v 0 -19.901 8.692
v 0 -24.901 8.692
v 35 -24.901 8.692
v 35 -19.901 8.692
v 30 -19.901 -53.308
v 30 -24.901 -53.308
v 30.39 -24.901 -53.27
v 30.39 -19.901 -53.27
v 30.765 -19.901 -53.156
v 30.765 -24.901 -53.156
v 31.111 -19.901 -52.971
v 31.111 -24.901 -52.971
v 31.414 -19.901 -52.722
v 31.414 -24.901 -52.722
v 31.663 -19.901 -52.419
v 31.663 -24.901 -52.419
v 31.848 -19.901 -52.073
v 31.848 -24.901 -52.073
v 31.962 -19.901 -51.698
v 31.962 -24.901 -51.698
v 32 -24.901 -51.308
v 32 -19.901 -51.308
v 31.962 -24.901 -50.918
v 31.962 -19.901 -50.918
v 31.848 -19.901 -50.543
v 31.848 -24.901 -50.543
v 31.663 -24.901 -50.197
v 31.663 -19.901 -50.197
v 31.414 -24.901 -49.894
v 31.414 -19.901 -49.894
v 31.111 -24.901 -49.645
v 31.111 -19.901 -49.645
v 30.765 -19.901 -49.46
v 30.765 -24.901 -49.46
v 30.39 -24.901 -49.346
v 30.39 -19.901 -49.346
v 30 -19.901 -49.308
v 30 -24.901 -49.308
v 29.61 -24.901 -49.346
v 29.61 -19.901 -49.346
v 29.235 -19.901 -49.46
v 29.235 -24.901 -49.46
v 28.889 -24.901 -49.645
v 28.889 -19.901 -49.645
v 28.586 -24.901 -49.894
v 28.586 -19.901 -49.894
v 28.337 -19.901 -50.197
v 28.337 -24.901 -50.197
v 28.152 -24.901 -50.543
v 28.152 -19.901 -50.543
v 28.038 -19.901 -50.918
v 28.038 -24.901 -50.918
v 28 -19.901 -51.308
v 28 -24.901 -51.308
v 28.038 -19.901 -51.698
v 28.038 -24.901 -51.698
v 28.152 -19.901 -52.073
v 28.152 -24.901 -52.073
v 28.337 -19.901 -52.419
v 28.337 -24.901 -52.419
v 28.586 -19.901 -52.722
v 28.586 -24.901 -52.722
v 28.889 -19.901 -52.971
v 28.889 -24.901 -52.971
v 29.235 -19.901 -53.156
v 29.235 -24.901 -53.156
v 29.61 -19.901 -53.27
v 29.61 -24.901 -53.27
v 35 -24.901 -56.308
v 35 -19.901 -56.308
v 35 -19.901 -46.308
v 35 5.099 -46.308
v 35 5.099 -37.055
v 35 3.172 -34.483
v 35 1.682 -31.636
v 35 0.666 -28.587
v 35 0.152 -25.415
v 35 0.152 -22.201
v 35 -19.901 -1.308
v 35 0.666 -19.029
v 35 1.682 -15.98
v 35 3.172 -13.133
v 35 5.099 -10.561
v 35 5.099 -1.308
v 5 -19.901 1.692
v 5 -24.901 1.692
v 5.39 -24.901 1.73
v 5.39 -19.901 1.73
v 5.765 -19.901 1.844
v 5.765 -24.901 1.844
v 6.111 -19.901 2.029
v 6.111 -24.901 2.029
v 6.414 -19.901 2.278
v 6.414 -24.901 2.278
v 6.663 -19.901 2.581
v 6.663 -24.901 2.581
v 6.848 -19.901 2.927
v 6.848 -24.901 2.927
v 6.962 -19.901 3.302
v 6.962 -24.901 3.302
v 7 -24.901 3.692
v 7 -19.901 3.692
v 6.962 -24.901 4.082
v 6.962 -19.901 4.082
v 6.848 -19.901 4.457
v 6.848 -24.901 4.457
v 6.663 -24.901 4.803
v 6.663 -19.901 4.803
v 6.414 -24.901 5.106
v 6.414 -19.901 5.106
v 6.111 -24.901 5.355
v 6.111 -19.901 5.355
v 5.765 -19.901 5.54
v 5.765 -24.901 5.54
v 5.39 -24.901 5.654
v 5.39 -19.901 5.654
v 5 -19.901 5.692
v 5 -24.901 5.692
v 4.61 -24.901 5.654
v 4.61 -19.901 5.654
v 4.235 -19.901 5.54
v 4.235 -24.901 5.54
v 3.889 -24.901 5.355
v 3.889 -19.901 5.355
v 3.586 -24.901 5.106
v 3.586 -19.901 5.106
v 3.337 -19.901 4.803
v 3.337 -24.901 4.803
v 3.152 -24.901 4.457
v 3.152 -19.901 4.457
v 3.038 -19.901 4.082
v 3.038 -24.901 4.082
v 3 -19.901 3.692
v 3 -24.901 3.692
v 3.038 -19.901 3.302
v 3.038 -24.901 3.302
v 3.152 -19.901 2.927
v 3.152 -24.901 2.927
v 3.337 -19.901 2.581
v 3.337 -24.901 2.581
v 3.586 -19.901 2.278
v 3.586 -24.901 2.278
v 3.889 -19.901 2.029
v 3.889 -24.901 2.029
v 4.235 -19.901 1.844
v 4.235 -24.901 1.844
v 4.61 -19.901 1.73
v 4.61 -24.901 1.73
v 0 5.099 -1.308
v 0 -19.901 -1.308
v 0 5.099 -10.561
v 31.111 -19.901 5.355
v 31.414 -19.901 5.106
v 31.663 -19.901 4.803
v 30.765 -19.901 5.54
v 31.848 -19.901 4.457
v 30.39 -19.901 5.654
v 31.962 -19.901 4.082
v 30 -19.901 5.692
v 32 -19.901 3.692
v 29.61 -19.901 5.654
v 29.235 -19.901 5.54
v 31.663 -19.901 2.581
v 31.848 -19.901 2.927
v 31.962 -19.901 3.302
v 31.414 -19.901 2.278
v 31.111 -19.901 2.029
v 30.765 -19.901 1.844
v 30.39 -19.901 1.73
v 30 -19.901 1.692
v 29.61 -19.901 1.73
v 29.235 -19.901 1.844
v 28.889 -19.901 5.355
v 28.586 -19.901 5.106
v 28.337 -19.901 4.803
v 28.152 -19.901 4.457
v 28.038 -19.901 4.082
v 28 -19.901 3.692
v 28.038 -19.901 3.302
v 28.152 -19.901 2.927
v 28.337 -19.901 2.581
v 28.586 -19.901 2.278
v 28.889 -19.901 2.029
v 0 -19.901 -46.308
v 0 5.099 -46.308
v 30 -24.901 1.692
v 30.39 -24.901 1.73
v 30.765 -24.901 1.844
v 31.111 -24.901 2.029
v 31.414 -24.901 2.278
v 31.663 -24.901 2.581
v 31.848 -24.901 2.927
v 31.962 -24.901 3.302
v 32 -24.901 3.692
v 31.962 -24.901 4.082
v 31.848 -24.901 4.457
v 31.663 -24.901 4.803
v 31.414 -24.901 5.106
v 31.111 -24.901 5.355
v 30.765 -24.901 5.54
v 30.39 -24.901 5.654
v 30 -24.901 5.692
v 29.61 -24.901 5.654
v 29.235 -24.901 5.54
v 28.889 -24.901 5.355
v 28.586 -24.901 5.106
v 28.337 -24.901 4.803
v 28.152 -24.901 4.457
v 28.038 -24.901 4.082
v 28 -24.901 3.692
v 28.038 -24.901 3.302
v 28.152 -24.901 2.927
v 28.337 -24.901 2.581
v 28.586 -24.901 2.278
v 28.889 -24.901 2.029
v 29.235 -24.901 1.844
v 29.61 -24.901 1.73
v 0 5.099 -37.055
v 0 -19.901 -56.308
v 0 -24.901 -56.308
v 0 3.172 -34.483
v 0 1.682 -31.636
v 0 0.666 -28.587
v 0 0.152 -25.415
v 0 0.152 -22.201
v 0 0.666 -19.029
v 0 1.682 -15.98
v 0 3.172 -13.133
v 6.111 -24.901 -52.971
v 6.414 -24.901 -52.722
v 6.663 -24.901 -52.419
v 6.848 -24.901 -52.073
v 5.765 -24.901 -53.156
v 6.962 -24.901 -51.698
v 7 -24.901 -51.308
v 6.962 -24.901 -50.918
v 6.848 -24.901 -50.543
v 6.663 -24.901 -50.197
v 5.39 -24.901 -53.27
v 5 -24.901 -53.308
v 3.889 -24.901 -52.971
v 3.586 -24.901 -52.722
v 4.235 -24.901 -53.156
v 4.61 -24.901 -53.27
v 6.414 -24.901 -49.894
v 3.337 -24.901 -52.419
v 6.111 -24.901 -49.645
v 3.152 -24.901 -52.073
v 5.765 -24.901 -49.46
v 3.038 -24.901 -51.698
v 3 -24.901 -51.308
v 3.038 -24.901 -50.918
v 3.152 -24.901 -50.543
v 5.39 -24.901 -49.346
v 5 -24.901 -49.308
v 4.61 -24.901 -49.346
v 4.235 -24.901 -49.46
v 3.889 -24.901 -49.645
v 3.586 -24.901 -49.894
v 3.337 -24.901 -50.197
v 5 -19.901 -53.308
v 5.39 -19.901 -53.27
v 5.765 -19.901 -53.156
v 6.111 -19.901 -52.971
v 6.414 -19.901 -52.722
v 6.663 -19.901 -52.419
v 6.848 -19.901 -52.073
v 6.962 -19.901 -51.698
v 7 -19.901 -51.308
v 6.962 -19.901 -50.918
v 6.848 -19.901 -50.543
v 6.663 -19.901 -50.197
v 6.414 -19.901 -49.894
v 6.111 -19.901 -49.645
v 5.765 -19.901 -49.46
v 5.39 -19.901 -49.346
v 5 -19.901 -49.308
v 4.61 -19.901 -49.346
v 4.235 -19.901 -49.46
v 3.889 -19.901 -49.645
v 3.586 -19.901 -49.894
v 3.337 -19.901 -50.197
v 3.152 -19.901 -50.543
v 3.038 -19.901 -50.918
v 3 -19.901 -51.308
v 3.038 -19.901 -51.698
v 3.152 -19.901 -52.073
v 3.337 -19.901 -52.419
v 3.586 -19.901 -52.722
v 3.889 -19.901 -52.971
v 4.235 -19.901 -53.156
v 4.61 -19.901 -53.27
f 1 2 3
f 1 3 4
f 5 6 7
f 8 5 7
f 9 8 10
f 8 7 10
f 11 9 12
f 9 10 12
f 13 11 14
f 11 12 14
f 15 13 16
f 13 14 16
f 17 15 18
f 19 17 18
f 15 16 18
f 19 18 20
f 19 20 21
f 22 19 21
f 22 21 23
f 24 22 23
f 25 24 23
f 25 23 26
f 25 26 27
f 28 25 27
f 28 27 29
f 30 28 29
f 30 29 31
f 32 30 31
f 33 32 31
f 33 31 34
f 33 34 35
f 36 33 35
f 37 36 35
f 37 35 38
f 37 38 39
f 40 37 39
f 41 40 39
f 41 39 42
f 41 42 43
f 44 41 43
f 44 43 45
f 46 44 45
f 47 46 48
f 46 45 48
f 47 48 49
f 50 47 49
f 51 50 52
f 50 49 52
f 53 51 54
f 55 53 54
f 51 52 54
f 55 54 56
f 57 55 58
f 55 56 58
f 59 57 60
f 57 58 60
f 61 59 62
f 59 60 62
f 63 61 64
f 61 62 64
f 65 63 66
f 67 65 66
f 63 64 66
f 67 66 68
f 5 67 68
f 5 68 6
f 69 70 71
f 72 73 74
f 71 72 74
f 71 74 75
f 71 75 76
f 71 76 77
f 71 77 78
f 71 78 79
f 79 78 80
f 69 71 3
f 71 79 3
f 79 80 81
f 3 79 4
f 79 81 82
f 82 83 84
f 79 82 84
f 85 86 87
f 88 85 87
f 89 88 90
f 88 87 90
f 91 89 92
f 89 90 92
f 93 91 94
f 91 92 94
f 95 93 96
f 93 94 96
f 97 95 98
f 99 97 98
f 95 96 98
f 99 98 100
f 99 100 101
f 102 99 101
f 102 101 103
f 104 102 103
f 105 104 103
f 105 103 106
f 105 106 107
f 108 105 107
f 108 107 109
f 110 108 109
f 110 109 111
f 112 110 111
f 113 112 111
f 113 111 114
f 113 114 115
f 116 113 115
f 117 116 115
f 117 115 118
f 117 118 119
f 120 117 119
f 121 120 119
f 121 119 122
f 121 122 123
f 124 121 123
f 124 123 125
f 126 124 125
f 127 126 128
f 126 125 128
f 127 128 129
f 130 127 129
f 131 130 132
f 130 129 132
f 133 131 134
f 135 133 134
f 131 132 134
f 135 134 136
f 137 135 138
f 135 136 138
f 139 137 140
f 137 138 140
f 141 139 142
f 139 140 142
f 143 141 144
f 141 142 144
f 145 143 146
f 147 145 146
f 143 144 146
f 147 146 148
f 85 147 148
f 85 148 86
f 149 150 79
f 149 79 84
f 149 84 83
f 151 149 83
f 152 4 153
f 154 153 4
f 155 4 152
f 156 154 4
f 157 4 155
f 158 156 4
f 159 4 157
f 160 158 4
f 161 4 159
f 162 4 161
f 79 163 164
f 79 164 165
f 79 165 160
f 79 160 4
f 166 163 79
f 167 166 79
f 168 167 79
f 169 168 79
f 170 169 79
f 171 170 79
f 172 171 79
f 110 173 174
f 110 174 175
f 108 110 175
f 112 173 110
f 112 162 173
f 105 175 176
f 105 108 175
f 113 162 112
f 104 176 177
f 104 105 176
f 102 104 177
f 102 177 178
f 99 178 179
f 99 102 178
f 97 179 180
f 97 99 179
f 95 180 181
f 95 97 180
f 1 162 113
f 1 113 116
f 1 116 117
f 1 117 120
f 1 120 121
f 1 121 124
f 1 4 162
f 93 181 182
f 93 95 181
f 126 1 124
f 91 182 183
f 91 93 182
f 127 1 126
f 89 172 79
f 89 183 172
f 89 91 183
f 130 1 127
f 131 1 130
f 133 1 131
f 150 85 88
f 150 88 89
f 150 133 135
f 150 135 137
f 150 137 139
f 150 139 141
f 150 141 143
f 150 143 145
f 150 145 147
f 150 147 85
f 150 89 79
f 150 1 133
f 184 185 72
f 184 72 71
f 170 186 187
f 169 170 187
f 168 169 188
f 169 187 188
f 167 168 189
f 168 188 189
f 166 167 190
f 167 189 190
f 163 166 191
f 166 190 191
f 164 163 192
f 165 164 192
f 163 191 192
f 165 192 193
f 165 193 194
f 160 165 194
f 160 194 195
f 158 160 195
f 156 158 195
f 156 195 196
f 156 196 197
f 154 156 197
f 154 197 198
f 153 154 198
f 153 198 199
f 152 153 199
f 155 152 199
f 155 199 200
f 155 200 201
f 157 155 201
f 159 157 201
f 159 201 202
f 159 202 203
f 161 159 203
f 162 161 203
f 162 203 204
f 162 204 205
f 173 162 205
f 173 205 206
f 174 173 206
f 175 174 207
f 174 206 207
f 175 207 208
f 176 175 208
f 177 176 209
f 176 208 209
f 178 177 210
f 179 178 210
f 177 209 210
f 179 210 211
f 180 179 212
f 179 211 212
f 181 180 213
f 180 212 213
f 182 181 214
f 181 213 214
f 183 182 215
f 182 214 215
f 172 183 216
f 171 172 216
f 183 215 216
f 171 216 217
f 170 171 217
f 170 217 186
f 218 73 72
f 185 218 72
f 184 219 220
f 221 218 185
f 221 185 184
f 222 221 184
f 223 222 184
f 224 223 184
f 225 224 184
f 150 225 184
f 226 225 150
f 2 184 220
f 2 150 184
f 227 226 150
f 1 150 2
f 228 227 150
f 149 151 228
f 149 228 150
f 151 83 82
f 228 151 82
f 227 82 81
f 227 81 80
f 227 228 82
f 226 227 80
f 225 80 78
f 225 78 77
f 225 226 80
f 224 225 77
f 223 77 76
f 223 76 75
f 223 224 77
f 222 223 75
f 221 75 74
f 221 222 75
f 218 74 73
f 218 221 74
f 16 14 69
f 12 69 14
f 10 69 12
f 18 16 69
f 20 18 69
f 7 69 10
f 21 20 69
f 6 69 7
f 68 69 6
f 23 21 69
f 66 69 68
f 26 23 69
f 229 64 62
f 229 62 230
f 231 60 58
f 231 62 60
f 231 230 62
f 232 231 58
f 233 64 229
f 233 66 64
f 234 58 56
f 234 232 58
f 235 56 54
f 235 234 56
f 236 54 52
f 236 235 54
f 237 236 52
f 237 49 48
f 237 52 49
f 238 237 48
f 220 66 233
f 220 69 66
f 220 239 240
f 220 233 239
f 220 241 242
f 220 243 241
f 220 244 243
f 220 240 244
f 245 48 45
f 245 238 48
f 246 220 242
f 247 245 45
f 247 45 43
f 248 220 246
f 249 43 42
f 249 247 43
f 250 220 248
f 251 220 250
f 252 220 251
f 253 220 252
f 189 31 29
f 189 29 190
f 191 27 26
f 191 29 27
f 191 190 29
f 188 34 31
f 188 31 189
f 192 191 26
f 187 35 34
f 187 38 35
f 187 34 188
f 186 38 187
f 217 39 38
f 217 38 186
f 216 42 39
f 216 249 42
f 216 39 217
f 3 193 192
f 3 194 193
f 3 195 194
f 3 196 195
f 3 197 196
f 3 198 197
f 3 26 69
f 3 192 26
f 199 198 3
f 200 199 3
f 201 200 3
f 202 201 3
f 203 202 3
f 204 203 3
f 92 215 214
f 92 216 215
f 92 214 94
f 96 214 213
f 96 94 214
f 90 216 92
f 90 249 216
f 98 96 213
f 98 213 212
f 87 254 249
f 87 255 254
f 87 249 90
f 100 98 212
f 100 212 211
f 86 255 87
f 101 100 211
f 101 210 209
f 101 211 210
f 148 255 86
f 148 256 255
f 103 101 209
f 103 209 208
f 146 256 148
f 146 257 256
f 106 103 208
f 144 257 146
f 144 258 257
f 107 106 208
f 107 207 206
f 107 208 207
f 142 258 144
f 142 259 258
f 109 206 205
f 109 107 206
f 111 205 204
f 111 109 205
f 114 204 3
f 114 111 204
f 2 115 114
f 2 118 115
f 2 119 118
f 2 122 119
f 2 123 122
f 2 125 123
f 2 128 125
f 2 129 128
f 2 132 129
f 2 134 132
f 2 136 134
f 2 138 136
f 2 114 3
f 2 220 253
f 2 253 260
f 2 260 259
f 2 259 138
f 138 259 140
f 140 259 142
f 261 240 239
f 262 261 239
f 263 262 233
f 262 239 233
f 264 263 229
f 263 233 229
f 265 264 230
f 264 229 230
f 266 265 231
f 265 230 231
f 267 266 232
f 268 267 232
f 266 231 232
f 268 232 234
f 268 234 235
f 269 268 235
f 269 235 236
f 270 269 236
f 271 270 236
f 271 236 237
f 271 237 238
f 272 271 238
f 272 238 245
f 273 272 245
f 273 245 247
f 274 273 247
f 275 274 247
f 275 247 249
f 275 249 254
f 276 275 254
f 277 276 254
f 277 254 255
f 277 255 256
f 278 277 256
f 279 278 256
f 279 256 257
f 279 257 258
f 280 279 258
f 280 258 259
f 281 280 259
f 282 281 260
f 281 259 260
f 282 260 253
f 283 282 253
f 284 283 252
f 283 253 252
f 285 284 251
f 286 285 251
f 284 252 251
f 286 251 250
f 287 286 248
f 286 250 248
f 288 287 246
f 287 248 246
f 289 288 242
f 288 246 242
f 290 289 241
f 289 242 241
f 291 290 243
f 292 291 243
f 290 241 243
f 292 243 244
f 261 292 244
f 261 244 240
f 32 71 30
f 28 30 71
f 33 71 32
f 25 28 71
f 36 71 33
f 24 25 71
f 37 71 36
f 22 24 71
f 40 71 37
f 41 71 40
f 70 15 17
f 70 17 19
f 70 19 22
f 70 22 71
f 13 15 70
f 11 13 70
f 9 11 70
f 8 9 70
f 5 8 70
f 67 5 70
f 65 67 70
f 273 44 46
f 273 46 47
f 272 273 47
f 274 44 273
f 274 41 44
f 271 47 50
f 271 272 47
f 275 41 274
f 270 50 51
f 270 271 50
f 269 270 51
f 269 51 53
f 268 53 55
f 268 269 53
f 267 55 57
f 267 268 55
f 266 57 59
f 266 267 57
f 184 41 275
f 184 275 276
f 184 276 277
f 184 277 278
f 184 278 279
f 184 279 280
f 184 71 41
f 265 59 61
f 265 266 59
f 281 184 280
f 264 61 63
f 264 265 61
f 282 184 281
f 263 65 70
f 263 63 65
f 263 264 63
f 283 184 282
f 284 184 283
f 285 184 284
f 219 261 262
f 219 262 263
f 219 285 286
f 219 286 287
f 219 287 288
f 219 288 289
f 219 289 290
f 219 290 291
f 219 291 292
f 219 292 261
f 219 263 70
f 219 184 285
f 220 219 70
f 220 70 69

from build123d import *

# Parameters (mm, degrees)
EXTRUDE_1_DEPTH     = 35
SKETCH_5_R          = 2
CUT_EXTRUDE_2_DEPTH = 10


with BuildPart() as part:
    # 草图3 → 凸台-拉伸1 (new body)
    with BuildSketch(Plane(origin=(0, 0, 0), x_dir=(0, 0, -1), z_dir=(1, 0, 0))):
        with BuildLine():
            Line((37.055330611, 5.099345853), (46.308021103, 5.099345853))
            Line((46.308021103, 5.099345853), (46.308021103, -19.900654147))
            Line((46.308021103, -19.900654147), (56.308021103, -19.900654147))
            Line((56.308021103, -19.900654147), (56.308021103, -24.900654147))
            Line((56.308021103, -24.900654147), (-8.691978897, -24.900654147))
            Line((-8.691978897, -24.900654147), (-8.691978897, -19.900654147))
            Line((-8.691978897, -19.900654147), (1.308021103, -19.900654147))
            Line((1.308021103, -19.900654147), (1.308021103, 5.099345853))
            Line((1.308021103, 5.099345853), (10.560711596, 5.099345853))
            ThreePointArc((10.560711596, 5.099345853), (23.808021103, 0.087069391), (37.055330611, 5.099345853))
        make_face()
    extrude(amount=EXTRUDE_1_DEPTH)

    # 草图5 → 切除-拉伸2 (cut)
    with BuildSketch(Plane(origin=(0, -24.900654147, 0), x_dir=(-1, 0, 0), z_dir=(0, -1, 0))):
        with Locations(Location((-30, -3.691978897, 0), (0, 0, 90))):
            Circle(SKETCH_5_R)
        with Locations(Location((-5, -3.691978897, 0), (0, 0, 90))):
            Circle(SKETCH_5_R)
        with Locations(Location((-30, 51.308021103, 0), (0, 0, 90))):
            Circle(SKETCH_5_R)
        with Locations(Location((-5, 51.308021103, 0), (0, 0, 90))):
            Circle(SKETCH_5_R)
    extrude(amount=-CUT_EXTRUDE_2_DEPTH, mode=Mode.SUBTRACT)


solid = part.part
